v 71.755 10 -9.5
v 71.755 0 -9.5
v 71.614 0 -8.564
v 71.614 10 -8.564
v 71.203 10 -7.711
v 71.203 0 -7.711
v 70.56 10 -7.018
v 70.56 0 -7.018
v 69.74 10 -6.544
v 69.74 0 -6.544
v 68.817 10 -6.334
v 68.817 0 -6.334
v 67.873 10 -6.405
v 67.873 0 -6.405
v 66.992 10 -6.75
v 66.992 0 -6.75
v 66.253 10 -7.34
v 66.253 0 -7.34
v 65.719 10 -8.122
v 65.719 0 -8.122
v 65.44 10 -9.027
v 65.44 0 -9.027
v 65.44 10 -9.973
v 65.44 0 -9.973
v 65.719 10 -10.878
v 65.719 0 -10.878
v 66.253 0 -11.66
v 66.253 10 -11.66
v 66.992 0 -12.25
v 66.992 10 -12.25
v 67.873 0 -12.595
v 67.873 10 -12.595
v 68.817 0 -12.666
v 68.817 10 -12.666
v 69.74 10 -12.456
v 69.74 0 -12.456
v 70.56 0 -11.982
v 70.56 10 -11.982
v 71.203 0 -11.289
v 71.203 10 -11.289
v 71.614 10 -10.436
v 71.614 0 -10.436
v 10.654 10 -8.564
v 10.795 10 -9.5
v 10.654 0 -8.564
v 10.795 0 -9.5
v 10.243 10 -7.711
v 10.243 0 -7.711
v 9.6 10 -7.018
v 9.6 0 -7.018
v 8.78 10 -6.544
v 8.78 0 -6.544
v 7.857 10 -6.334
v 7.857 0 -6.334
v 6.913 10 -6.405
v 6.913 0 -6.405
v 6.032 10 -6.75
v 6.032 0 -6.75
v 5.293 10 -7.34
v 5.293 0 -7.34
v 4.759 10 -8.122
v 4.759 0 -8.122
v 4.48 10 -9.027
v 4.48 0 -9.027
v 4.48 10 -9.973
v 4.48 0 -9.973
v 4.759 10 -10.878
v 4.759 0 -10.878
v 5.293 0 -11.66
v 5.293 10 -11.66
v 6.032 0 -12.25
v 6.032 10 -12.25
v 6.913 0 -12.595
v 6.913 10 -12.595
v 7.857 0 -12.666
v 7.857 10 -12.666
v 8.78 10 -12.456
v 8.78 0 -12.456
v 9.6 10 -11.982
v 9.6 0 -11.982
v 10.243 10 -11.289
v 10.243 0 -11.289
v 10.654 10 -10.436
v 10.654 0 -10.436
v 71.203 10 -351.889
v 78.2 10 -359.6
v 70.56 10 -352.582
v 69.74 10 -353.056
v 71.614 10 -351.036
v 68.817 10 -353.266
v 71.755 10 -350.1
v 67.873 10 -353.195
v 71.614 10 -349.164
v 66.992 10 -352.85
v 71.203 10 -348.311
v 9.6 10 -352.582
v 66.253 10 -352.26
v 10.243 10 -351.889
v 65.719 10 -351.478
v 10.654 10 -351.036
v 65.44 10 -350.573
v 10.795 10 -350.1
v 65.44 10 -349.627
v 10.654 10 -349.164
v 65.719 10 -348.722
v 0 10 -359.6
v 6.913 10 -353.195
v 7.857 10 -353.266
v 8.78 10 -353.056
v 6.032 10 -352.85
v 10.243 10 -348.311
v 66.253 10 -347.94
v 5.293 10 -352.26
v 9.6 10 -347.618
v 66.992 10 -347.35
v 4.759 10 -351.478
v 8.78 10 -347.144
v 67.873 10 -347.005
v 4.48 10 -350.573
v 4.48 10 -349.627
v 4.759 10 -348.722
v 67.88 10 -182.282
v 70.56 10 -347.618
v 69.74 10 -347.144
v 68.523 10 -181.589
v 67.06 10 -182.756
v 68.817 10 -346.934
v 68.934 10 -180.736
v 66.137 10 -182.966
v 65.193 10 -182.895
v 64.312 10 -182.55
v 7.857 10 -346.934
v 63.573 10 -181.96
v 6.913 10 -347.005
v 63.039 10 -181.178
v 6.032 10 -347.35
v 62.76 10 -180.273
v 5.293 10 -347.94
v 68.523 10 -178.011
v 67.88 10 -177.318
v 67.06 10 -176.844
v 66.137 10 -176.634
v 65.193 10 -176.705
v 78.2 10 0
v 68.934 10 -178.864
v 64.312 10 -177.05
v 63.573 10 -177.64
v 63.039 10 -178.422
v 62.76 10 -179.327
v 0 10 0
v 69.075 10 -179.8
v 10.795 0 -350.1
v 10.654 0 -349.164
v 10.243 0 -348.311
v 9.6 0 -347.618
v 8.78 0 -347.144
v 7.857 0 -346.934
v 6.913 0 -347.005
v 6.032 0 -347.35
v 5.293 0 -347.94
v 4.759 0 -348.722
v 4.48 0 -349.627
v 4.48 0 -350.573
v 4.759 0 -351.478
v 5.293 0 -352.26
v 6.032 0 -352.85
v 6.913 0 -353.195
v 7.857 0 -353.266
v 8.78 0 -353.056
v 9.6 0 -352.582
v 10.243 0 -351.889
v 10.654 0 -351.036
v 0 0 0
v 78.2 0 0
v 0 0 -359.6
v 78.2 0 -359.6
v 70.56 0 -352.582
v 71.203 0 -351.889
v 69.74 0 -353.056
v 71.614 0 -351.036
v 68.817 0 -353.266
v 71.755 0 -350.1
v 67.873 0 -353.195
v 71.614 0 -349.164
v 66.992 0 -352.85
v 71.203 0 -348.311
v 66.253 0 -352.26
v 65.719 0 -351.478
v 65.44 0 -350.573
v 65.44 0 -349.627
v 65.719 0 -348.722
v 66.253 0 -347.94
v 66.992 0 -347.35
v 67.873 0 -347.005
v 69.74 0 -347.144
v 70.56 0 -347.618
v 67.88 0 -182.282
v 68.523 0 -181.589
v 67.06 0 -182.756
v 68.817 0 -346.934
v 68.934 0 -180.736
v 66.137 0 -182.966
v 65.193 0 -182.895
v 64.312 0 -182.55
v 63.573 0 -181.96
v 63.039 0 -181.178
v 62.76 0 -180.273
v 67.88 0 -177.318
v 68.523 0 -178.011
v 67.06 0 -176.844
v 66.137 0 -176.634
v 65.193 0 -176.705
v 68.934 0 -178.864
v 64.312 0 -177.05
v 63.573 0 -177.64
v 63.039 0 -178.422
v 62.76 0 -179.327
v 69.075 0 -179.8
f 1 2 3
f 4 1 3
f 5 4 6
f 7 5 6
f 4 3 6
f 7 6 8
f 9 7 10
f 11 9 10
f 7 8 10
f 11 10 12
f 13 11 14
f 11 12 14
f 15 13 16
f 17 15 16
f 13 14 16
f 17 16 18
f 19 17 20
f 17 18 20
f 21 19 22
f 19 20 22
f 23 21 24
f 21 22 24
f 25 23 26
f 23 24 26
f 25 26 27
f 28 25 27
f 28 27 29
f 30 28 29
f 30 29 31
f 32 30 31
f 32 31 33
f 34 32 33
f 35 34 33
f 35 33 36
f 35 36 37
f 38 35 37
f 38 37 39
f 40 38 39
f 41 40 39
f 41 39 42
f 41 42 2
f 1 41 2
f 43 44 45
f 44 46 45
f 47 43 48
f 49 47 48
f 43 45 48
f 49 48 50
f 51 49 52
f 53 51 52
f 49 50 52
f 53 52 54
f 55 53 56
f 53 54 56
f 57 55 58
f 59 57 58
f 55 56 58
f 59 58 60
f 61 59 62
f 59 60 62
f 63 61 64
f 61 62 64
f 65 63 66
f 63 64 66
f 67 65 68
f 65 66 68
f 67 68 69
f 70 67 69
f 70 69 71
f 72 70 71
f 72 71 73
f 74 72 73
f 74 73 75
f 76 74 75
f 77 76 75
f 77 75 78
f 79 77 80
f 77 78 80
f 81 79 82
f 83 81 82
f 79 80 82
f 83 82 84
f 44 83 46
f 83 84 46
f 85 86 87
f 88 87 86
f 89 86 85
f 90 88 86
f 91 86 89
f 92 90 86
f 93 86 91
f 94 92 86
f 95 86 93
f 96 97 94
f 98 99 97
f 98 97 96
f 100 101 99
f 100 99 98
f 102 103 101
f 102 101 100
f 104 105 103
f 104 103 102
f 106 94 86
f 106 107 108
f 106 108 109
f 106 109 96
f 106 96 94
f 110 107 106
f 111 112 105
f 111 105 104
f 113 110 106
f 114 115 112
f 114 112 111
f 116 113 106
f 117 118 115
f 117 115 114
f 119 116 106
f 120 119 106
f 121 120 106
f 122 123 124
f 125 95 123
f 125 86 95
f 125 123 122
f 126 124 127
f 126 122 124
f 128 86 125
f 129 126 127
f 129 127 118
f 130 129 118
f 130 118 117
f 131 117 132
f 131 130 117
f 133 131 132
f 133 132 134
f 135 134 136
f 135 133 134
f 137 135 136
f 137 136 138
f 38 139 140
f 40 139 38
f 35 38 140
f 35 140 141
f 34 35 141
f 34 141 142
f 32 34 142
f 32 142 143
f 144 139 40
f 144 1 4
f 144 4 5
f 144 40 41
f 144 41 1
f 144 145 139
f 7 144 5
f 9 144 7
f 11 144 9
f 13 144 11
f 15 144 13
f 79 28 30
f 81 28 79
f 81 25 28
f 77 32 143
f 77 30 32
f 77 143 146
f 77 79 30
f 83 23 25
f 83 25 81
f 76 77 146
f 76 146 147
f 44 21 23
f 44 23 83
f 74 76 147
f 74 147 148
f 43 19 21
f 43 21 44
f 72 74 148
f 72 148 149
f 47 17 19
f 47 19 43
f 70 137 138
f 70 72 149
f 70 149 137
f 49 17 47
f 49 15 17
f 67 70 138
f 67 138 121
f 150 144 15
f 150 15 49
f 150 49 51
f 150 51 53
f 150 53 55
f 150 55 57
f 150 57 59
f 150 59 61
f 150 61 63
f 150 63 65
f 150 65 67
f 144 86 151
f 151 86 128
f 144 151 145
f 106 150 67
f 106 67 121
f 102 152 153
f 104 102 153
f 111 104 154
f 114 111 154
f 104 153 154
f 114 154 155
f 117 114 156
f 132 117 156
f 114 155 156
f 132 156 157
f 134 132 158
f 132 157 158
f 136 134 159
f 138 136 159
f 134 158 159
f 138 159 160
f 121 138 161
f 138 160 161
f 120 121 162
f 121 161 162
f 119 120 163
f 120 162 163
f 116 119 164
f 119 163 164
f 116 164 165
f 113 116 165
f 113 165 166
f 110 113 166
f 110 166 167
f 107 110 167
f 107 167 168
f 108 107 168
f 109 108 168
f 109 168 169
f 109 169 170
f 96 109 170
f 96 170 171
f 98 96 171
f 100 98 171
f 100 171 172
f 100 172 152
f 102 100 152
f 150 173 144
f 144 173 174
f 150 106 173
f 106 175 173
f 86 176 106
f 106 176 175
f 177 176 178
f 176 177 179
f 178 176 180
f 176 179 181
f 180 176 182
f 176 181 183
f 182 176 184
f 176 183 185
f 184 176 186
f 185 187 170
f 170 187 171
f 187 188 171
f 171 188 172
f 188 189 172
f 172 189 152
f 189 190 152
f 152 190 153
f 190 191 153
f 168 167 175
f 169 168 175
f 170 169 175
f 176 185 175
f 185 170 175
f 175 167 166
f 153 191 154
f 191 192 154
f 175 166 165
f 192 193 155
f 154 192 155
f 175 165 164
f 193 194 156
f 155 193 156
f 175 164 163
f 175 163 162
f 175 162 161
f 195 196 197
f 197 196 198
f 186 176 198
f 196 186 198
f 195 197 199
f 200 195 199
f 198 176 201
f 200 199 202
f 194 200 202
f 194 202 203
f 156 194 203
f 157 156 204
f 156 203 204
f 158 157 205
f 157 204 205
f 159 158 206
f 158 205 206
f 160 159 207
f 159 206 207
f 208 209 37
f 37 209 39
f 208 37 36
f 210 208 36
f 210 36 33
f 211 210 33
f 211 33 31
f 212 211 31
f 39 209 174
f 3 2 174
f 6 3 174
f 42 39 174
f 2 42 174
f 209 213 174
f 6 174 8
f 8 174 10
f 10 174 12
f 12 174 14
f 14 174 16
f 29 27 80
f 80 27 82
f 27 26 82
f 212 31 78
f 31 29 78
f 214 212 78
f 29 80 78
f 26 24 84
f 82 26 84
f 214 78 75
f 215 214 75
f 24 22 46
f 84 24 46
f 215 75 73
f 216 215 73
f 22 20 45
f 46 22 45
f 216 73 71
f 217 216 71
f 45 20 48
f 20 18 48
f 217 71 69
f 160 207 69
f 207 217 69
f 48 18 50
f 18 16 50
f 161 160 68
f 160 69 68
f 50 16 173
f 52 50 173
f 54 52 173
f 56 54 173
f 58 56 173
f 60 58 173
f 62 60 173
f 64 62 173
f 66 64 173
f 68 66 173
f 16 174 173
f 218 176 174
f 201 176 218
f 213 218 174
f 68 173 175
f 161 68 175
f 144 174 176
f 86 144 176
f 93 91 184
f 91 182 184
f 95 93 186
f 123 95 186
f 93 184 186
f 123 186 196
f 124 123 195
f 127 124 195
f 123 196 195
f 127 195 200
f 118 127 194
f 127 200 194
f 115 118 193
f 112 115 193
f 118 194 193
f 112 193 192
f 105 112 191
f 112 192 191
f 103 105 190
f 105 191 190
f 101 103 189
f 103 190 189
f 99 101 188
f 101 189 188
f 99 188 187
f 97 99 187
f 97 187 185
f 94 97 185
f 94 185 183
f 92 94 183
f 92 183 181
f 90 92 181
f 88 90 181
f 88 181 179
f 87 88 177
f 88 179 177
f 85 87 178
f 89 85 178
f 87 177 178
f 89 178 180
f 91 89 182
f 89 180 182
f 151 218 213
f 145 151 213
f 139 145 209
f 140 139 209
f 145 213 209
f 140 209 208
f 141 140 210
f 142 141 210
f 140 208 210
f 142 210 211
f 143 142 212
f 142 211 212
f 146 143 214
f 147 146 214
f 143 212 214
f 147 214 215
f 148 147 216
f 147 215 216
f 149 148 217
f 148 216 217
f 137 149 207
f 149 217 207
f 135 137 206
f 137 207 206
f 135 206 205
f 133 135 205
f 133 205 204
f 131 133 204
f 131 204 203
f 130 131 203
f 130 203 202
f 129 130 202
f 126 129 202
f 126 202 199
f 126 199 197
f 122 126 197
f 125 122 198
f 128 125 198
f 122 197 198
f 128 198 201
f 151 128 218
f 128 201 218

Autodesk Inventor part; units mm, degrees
ref_plane "YZ Plane" through (0, 0, 0) normal (1, 0, 0) x (0, 1, 0)
ref_plane "XZ Plane" through (0, 0, 0) normal (0, 1, 0) x (-1, 0, 0)
ref_plane "XY Plane" through (0, 0, 0) normal (0, 0, 1) x (1, 0, 0)
sketch "Sketch1" plane through (0, 0, 0) normal (0, 1, 0) x (-1, 0, 0)
  line L0 (0, 0) -> (-78.2, 0)
  line L1 (-78.2, 0) -> (-78.2, -359.6)
  line L2 (-78.2, -359.6) -> (0, -359.6)
  line L3 (0, -359.6) -> (0, 0)
  dimension "d0" = 78.2
  dimension "d1" = 359.6
extrude "Extrusion1" add sketch "Sketch1" along normal blind 10
sketch "Sketch2" plane through (0, 0, 0) normal (0, -1, 0) x (1, 0, 0)
  circle A0 centre (7.62, -350.1) radius 3.175
  circle A1 centre (68.58, -350.1) radius 3.175
  circle A2 centre (7.62, -9.5) radius 3.175
  circle A3 centre (68.58, -9.5) radius 3.175
extrude "Extrusion2" cut sketch "Sketch2" against normal blind 25.4
sketch "Sketch3" plane through (0, 0, 0) normal (0, -1, 0) x (1, 0, 0)
  circle A0 centre (65.9, -179.8) radius 3.175
  dimension "d8" = 6.35
extrude "Extrusion3" cut sketch "Sketch3" against normal blind 25.4
properties part number "Top Plate" material "Aluminum 6061"
